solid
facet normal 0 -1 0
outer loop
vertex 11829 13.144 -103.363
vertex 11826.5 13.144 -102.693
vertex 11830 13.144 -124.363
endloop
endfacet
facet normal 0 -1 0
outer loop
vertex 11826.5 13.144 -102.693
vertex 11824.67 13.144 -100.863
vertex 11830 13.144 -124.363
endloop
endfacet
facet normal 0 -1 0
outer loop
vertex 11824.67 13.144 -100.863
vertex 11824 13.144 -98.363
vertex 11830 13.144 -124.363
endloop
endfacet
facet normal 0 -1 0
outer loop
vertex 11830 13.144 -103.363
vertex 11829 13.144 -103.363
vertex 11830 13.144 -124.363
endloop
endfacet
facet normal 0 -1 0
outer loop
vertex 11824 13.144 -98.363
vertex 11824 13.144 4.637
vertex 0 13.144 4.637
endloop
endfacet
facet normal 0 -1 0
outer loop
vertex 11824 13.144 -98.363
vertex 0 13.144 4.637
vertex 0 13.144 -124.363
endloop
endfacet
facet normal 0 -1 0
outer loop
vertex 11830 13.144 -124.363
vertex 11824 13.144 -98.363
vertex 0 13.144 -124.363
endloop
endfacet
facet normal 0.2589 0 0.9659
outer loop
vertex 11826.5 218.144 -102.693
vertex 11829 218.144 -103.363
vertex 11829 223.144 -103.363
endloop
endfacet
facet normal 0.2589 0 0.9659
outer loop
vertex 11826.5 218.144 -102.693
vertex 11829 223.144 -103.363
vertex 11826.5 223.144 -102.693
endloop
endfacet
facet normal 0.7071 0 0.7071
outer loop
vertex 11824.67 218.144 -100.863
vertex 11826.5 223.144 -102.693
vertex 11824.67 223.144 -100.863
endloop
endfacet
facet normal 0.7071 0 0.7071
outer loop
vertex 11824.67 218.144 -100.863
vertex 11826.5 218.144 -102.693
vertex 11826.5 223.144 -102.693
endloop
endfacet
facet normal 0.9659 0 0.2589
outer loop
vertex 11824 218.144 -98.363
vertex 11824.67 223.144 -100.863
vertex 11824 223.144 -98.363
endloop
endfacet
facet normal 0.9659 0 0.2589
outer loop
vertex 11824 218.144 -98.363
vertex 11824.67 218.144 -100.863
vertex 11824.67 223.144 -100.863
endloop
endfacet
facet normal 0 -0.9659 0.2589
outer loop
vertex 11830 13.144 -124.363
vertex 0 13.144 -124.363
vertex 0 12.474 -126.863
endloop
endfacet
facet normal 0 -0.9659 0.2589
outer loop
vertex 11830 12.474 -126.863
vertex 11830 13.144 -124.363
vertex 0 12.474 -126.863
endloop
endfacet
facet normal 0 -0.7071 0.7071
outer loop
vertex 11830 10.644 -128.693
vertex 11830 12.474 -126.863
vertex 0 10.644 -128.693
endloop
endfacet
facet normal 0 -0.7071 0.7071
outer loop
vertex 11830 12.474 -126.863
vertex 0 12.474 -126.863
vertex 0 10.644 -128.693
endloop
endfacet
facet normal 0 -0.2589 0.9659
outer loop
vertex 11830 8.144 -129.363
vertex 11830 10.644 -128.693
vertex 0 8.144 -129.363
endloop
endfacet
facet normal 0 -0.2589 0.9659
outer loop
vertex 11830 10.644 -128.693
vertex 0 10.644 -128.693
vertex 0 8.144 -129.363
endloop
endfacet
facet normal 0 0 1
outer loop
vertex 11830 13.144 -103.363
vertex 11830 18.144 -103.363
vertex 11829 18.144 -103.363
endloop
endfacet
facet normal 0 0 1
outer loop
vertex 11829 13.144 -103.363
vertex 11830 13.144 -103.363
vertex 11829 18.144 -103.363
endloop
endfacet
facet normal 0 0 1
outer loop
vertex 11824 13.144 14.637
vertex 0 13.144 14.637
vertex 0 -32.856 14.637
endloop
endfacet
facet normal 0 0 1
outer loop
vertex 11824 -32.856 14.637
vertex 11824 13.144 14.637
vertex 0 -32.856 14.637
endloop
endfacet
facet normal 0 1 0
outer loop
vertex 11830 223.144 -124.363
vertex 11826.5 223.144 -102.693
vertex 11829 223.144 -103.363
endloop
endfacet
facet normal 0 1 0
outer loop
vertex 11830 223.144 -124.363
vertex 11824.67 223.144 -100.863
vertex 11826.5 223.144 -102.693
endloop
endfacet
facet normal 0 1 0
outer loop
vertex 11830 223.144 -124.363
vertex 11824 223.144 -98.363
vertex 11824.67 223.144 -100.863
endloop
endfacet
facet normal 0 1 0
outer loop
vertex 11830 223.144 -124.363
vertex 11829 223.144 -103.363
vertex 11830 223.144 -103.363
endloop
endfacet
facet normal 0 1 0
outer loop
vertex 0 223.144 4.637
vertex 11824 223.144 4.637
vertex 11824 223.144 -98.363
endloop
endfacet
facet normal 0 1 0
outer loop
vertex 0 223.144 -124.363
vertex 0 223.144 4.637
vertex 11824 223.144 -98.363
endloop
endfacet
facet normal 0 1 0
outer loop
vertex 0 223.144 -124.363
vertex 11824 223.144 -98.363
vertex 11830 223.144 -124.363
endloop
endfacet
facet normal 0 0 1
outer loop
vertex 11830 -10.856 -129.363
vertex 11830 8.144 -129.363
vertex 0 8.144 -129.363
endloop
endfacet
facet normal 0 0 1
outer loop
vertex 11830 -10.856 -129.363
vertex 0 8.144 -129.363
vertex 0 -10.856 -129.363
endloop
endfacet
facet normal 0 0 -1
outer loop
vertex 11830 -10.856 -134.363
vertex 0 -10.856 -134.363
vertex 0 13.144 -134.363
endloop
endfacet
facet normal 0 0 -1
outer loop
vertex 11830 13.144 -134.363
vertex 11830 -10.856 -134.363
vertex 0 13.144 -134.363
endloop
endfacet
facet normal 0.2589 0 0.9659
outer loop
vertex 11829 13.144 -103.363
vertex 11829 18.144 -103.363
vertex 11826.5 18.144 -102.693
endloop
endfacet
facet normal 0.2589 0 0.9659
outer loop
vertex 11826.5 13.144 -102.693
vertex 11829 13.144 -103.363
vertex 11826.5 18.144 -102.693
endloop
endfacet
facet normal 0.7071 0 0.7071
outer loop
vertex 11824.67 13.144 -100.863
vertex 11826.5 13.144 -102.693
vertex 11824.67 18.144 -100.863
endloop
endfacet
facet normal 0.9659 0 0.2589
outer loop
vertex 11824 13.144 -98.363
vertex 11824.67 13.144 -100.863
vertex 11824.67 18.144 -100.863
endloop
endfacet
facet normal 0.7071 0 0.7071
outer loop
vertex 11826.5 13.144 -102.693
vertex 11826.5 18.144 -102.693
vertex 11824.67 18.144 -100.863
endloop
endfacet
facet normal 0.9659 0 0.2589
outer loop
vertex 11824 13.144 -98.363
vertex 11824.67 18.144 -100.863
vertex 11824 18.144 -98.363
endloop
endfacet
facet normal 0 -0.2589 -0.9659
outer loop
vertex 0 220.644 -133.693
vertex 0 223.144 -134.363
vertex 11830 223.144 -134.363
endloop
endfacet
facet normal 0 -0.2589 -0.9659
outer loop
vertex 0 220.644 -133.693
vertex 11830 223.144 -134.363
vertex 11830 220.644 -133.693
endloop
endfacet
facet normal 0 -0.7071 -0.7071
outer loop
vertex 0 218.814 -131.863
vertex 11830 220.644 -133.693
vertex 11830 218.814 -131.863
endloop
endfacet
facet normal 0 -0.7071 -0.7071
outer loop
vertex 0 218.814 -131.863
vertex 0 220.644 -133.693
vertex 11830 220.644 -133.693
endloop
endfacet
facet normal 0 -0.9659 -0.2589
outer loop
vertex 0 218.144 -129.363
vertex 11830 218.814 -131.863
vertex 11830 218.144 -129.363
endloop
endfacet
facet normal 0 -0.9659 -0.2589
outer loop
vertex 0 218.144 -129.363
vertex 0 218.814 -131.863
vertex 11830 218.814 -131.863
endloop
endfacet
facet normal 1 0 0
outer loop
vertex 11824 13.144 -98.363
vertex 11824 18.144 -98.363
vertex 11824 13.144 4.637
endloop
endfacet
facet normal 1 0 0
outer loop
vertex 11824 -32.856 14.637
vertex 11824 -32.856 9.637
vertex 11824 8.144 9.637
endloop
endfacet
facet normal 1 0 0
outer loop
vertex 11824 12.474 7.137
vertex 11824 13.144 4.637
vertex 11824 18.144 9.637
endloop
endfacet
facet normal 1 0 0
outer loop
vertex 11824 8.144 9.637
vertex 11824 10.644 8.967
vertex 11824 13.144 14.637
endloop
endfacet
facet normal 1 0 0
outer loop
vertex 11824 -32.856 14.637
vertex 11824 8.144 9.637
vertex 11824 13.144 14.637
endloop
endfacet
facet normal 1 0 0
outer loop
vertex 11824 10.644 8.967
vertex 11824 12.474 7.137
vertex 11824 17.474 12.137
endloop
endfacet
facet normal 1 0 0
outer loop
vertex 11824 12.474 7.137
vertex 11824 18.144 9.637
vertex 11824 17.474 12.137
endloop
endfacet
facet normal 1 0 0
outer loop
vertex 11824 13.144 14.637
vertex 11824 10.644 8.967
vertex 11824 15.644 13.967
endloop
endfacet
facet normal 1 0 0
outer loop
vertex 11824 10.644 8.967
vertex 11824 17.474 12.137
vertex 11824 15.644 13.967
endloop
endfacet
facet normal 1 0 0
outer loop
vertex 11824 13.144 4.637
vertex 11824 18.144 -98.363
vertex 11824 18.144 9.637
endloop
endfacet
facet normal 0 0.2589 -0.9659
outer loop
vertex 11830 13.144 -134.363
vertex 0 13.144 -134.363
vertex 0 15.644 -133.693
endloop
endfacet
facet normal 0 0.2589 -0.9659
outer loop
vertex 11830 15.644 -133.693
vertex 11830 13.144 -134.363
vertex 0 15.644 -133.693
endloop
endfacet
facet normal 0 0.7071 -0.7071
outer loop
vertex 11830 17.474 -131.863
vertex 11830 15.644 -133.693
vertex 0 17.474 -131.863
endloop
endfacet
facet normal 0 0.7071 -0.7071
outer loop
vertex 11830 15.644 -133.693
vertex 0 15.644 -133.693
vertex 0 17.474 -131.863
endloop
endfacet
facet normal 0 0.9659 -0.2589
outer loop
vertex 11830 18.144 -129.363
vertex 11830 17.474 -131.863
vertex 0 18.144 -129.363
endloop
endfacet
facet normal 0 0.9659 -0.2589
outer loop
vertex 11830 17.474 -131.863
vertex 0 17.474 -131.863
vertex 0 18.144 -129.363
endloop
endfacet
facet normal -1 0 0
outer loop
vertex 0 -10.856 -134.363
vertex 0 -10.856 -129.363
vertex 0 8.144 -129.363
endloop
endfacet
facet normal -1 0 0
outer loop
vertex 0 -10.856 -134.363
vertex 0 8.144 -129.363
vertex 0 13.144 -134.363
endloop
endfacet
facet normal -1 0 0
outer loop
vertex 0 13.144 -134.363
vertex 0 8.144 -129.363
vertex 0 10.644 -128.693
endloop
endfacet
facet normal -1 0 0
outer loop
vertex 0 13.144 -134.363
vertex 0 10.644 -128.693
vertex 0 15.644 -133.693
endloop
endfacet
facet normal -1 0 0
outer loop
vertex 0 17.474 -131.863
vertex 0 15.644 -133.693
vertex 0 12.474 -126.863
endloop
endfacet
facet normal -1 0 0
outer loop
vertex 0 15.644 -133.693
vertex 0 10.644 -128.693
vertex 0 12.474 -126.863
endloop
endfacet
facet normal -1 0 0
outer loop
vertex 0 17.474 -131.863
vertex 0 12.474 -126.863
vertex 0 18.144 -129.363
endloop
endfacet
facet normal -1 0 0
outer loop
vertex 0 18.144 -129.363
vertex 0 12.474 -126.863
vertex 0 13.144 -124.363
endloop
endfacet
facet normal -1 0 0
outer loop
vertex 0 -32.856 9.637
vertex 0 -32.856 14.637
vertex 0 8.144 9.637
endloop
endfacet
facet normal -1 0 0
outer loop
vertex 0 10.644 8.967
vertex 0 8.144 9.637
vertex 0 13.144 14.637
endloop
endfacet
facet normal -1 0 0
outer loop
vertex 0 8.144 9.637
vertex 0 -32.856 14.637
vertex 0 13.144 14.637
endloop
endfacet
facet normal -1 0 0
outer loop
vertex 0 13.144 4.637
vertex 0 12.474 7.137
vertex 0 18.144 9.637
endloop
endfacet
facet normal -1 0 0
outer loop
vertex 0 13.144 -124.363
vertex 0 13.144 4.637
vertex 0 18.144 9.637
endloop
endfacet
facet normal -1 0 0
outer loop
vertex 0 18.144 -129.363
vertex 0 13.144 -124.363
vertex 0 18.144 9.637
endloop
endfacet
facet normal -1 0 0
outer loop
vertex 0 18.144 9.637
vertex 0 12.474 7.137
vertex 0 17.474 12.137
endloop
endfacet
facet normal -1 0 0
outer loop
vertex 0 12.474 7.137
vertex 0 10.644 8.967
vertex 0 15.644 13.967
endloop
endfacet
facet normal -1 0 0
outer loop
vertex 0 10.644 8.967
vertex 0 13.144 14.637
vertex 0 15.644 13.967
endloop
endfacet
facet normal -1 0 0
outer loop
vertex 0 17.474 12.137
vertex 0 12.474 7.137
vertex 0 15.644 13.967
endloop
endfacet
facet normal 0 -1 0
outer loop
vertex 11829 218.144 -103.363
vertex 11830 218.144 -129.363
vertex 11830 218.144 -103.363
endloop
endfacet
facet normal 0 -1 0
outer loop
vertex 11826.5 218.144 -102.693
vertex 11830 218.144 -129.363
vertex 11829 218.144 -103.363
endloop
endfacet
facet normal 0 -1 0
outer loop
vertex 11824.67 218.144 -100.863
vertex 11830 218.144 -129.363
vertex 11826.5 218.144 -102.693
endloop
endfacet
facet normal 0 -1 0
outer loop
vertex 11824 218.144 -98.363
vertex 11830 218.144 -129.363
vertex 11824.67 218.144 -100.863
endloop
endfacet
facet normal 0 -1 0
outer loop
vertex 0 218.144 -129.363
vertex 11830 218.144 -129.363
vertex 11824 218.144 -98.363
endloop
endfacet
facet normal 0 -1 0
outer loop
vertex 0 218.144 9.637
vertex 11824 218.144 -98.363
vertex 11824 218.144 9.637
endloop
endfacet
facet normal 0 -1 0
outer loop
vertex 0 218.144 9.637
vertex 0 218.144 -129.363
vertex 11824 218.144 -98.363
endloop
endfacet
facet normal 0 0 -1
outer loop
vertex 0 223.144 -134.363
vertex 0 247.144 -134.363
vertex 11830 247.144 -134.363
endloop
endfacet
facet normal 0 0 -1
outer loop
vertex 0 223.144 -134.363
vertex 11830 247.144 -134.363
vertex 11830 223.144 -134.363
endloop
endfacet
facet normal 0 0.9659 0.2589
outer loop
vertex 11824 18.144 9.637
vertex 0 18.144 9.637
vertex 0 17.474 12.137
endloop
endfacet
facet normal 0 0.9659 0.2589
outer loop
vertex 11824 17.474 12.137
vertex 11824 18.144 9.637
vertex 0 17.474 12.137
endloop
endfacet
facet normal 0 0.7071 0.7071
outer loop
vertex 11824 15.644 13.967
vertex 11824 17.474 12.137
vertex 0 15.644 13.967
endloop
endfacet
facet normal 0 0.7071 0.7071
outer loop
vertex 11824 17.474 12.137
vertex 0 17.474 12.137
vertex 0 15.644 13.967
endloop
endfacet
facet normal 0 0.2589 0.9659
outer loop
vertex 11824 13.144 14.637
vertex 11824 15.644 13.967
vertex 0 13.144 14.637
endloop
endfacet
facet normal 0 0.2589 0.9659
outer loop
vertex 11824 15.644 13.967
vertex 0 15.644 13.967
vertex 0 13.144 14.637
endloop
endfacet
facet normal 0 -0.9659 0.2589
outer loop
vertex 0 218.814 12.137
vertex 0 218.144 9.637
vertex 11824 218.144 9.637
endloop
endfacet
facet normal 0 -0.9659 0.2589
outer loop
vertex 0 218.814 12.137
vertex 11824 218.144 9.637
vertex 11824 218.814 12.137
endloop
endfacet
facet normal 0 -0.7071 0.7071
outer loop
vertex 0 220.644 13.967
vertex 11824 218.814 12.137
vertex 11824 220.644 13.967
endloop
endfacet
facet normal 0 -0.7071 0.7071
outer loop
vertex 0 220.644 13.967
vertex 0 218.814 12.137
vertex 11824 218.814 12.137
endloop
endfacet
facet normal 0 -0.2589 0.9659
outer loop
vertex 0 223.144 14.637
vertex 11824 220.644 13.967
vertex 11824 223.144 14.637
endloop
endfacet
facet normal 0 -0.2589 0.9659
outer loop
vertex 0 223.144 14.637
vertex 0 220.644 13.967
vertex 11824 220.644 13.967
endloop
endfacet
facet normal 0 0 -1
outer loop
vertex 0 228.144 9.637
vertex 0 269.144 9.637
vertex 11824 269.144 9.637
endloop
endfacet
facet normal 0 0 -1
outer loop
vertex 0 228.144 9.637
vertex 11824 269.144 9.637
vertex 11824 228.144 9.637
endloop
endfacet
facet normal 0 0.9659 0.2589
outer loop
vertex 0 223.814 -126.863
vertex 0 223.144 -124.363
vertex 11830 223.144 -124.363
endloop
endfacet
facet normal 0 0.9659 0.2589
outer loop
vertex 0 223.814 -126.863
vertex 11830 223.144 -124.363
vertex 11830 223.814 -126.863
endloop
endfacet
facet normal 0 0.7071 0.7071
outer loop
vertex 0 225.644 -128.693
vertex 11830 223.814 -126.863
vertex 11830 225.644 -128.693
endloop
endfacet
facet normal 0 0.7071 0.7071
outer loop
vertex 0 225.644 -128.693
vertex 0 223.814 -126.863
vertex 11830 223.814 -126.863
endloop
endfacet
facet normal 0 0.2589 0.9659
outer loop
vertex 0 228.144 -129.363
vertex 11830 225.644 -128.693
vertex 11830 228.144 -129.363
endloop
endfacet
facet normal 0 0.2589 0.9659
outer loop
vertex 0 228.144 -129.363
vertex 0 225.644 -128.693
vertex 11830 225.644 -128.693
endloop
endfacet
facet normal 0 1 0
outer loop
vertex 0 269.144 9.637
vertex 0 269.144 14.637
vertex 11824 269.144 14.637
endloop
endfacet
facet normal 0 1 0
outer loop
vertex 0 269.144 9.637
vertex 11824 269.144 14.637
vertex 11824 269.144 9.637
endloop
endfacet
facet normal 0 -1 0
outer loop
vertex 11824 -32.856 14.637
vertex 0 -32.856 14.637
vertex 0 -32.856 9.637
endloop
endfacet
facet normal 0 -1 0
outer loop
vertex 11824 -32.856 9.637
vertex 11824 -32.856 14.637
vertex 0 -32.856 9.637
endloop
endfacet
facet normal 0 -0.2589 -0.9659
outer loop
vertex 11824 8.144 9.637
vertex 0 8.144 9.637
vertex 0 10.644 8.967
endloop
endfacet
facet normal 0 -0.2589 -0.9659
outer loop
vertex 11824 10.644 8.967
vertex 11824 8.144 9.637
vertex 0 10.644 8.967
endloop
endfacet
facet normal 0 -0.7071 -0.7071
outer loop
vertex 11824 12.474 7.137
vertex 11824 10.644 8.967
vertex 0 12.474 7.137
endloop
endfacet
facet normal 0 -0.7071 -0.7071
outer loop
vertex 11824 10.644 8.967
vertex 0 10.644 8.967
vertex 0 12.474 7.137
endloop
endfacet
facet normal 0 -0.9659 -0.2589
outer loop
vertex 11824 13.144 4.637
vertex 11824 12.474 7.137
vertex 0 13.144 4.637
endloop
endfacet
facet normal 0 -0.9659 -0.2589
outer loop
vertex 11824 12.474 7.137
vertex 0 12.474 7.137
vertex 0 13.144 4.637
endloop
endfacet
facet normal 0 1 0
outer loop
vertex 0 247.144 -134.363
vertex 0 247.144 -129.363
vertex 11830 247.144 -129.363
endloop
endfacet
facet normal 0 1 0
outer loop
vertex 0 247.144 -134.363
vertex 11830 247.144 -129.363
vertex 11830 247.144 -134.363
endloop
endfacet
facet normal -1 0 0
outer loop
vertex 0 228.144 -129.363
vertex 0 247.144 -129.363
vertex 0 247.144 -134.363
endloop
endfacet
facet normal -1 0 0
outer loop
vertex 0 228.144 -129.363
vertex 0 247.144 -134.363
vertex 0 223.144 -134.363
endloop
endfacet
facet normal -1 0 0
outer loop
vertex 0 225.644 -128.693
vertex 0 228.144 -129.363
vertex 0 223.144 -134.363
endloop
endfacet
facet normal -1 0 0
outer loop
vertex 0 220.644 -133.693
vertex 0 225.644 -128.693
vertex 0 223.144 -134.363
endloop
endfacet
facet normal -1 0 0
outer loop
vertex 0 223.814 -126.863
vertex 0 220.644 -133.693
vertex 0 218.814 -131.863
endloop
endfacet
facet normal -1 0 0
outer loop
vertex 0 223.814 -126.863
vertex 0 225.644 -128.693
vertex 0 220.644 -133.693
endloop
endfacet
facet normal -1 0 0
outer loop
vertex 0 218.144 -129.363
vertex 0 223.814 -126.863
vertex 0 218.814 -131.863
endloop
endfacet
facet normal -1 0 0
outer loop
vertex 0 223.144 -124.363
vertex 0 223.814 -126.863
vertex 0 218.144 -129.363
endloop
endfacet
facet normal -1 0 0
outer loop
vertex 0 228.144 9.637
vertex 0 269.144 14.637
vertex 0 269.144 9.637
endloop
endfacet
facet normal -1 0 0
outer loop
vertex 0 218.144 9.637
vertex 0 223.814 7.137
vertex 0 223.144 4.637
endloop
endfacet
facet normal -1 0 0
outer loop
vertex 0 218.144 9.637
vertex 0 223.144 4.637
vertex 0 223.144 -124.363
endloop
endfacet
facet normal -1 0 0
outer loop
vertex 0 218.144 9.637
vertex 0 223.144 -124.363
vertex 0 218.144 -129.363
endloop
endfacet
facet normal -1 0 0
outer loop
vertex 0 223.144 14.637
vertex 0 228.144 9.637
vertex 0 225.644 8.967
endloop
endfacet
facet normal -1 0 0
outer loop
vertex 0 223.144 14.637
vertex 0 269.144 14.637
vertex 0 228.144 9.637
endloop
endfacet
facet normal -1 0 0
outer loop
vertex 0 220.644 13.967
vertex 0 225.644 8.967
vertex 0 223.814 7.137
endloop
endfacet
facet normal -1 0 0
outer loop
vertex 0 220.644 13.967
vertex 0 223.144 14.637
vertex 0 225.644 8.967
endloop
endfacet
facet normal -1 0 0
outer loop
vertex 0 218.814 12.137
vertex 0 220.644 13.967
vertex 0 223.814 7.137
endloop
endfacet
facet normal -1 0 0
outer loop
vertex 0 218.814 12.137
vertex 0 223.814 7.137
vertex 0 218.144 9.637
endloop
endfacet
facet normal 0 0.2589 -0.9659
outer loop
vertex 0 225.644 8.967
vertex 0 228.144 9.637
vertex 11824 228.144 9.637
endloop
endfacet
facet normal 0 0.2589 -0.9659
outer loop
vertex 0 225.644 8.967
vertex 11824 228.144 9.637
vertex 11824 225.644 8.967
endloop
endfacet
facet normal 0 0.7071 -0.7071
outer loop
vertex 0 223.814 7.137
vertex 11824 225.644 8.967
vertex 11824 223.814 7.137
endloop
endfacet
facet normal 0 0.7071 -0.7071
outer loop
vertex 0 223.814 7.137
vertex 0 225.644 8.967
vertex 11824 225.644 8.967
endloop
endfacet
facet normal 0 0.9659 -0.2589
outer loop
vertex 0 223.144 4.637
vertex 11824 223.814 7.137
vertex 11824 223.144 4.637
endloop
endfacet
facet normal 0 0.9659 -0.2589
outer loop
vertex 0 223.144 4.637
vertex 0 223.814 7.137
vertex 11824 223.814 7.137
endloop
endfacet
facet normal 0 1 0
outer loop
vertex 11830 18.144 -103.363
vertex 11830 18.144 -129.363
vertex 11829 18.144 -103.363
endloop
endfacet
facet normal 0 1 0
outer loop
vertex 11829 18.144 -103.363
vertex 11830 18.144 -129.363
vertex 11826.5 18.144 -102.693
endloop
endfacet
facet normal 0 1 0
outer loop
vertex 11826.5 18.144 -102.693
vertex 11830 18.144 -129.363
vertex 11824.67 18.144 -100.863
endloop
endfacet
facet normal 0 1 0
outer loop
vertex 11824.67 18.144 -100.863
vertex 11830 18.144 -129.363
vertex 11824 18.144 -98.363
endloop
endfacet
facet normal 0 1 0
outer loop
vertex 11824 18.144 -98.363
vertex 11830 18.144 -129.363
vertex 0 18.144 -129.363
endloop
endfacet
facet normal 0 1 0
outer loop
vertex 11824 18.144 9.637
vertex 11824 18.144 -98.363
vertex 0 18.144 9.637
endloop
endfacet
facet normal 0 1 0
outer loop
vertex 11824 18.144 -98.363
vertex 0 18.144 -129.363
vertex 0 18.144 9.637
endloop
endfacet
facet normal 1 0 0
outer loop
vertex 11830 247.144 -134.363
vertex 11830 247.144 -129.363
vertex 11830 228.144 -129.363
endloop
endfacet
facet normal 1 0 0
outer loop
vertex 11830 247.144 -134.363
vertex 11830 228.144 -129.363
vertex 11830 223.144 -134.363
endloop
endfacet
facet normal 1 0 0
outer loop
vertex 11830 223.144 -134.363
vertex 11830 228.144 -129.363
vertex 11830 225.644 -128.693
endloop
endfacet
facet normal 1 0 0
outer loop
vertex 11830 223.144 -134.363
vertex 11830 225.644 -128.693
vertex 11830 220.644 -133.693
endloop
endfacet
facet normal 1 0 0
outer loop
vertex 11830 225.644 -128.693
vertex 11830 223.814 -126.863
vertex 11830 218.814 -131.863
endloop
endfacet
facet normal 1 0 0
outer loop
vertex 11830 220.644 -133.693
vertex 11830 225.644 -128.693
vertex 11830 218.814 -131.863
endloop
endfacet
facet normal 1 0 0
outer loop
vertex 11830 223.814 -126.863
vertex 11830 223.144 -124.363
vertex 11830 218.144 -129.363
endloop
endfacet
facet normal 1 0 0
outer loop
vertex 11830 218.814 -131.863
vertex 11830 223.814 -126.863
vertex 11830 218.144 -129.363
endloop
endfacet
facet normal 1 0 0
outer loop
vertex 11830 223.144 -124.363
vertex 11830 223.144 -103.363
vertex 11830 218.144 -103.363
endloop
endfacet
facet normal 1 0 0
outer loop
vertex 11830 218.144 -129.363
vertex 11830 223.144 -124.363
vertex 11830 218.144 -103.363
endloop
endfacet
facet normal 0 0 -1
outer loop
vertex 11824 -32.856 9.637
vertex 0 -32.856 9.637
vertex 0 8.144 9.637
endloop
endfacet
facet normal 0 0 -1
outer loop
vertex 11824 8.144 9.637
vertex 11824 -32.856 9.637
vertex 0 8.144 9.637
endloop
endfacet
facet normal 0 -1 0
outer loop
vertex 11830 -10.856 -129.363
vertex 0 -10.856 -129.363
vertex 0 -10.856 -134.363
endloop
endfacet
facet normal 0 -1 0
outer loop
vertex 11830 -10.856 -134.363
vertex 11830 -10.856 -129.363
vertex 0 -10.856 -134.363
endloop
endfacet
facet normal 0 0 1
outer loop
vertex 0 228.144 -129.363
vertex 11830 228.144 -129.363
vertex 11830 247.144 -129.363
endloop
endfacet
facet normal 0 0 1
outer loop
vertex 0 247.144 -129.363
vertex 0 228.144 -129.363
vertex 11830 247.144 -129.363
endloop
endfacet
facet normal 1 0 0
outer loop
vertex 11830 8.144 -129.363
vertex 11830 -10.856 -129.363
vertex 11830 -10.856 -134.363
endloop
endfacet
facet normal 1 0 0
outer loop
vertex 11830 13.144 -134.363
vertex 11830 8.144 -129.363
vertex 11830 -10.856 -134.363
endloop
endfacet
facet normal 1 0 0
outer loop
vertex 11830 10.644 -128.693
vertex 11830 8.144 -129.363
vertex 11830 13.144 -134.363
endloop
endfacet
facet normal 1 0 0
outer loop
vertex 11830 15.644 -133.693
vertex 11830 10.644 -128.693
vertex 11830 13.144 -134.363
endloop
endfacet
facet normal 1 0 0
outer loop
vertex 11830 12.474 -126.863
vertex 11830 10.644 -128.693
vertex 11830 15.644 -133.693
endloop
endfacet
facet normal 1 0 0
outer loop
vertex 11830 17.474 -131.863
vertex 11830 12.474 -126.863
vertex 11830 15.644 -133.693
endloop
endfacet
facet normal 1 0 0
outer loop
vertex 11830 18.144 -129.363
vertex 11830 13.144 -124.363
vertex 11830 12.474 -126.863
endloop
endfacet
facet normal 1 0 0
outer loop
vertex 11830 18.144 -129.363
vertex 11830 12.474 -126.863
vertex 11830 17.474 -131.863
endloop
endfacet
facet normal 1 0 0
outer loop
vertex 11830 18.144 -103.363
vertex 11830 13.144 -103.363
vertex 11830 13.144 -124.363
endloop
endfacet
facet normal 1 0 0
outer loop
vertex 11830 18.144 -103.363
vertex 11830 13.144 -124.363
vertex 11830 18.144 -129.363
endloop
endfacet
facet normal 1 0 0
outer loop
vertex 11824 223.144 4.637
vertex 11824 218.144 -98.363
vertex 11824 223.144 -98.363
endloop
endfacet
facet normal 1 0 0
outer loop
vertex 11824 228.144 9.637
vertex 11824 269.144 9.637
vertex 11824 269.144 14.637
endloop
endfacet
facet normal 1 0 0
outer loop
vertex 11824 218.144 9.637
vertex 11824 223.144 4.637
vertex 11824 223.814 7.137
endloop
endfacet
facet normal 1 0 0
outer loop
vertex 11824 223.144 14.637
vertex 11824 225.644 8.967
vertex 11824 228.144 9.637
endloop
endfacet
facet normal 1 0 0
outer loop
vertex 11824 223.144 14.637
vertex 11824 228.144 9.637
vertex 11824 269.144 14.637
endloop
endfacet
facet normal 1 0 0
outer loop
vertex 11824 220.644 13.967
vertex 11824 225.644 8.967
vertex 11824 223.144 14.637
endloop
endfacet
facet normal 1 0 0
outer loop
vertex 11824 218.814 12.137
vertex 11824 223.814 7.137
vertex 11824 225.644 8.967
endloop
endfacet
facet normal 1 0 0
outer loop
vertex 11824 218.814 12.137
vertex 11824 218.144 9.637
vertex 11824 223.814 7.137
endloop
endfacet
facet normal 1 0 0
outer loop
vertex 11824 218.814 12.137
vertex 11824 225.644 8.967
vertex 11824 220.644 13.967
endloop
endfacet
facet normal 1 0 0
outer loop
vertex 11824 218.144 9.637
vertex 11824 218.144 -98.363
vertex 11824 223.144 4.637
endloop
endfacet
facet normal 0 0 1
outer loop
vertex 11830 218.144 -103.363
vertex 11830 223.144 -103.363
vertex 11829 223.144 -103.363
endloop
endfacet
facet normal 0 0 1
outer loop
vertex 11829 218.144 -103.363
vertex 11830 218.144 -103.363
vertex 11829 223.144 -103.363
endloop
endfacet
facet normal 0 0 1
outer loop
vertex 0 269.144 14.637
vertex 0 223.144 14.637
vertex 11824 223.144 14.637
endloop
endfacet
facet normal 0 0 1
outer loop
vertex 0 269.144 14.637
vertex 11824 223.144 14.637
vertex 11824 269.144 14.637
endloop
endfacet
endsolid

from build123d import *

# Parameters (mm, degrees)
F1_DEPTH = 11830
F3_DEPTH = 51


with BuildPart() as f1:
    # F0 (on Right) → F1 (new body)
    with BuildSketch(Plane.YZ):
        with BuildLine():
            Line((13.144038, 14.637224), (-32.855962, 14.637224))
            Line((-32.855962, 14.637224), (-32.855962, 9.637224))
            Line((-32.855962, 9.637224), (8.144038, 9.637224))
            ThreePointArc((8.144038, 9.637224), (11.679572, 8.172757), (13.144038, 4.637224))
            Line((13.144038, 4.637224), (13.144038, -124.362776))
            ThreePointArc((13.144038, -124.362776), (11.679572, -127.89831), (8.144038, -129.362776))
            Line((8.144038, -129.362776), (-10.855962, -129.362776))
            Line((-10.855962, -129.362776), (-10.855962, -134.362776))
            Line((-10.855962, -134.362776), (13.144038, -134.362776))
            ThreePointArc((13.144038, -134.362776), (16.679572, -132.89831), (18.144038, -129.362776))
            Line((18.144038, -129.362776), (18.144038, 9.637224))
            ThreePointArc((18.144038, 9.637224), (16.679572, 13.172757), (13.144038, 14.637224))
        make_face()
    extrude(amount=F1_DEPTH)

    # F2 (on face) → F3 (cut)
    with BuildSketch(Plane(origin=(0, 18.144038, 0), x_dir=(-1, 0, 0), z_dir=(0, 1, 0))):
        with BuildLine():
            Line((-11824, 9.637224), (-11830, 9.637224))
            Line((-11830, 9.637224), (-11830, -103.362776))
            Line((-11830, -103.362776), (-11829, -103.362776))
            ThreePointArc((-11829, -103.362776), (-11825.464466, -101.89831), (-11824, -98.362776))
            Line((-11824, -98.362776), (-11824, 9.637224))
        make_face()
        Polygon((-11830, 20.8505), (-11830, 9.637224), (-11824, 9.637224), (-11824, 20.8505), (-11825, 20.8505), align=None)
    extrude(amount=-F3_DEPTH, mode=Mode.SUBTRACT)


with BuildPart() as f5_1:
    # F5: instance of F1
    add(f1.part.mirror(Plane(origin=(5912.580681, 118.144038, -59.868277), x_dir=(-1, 0, 0), z_dir=(0, 1, 0))))


solid = Compound([f1.part, f5_1.part])
